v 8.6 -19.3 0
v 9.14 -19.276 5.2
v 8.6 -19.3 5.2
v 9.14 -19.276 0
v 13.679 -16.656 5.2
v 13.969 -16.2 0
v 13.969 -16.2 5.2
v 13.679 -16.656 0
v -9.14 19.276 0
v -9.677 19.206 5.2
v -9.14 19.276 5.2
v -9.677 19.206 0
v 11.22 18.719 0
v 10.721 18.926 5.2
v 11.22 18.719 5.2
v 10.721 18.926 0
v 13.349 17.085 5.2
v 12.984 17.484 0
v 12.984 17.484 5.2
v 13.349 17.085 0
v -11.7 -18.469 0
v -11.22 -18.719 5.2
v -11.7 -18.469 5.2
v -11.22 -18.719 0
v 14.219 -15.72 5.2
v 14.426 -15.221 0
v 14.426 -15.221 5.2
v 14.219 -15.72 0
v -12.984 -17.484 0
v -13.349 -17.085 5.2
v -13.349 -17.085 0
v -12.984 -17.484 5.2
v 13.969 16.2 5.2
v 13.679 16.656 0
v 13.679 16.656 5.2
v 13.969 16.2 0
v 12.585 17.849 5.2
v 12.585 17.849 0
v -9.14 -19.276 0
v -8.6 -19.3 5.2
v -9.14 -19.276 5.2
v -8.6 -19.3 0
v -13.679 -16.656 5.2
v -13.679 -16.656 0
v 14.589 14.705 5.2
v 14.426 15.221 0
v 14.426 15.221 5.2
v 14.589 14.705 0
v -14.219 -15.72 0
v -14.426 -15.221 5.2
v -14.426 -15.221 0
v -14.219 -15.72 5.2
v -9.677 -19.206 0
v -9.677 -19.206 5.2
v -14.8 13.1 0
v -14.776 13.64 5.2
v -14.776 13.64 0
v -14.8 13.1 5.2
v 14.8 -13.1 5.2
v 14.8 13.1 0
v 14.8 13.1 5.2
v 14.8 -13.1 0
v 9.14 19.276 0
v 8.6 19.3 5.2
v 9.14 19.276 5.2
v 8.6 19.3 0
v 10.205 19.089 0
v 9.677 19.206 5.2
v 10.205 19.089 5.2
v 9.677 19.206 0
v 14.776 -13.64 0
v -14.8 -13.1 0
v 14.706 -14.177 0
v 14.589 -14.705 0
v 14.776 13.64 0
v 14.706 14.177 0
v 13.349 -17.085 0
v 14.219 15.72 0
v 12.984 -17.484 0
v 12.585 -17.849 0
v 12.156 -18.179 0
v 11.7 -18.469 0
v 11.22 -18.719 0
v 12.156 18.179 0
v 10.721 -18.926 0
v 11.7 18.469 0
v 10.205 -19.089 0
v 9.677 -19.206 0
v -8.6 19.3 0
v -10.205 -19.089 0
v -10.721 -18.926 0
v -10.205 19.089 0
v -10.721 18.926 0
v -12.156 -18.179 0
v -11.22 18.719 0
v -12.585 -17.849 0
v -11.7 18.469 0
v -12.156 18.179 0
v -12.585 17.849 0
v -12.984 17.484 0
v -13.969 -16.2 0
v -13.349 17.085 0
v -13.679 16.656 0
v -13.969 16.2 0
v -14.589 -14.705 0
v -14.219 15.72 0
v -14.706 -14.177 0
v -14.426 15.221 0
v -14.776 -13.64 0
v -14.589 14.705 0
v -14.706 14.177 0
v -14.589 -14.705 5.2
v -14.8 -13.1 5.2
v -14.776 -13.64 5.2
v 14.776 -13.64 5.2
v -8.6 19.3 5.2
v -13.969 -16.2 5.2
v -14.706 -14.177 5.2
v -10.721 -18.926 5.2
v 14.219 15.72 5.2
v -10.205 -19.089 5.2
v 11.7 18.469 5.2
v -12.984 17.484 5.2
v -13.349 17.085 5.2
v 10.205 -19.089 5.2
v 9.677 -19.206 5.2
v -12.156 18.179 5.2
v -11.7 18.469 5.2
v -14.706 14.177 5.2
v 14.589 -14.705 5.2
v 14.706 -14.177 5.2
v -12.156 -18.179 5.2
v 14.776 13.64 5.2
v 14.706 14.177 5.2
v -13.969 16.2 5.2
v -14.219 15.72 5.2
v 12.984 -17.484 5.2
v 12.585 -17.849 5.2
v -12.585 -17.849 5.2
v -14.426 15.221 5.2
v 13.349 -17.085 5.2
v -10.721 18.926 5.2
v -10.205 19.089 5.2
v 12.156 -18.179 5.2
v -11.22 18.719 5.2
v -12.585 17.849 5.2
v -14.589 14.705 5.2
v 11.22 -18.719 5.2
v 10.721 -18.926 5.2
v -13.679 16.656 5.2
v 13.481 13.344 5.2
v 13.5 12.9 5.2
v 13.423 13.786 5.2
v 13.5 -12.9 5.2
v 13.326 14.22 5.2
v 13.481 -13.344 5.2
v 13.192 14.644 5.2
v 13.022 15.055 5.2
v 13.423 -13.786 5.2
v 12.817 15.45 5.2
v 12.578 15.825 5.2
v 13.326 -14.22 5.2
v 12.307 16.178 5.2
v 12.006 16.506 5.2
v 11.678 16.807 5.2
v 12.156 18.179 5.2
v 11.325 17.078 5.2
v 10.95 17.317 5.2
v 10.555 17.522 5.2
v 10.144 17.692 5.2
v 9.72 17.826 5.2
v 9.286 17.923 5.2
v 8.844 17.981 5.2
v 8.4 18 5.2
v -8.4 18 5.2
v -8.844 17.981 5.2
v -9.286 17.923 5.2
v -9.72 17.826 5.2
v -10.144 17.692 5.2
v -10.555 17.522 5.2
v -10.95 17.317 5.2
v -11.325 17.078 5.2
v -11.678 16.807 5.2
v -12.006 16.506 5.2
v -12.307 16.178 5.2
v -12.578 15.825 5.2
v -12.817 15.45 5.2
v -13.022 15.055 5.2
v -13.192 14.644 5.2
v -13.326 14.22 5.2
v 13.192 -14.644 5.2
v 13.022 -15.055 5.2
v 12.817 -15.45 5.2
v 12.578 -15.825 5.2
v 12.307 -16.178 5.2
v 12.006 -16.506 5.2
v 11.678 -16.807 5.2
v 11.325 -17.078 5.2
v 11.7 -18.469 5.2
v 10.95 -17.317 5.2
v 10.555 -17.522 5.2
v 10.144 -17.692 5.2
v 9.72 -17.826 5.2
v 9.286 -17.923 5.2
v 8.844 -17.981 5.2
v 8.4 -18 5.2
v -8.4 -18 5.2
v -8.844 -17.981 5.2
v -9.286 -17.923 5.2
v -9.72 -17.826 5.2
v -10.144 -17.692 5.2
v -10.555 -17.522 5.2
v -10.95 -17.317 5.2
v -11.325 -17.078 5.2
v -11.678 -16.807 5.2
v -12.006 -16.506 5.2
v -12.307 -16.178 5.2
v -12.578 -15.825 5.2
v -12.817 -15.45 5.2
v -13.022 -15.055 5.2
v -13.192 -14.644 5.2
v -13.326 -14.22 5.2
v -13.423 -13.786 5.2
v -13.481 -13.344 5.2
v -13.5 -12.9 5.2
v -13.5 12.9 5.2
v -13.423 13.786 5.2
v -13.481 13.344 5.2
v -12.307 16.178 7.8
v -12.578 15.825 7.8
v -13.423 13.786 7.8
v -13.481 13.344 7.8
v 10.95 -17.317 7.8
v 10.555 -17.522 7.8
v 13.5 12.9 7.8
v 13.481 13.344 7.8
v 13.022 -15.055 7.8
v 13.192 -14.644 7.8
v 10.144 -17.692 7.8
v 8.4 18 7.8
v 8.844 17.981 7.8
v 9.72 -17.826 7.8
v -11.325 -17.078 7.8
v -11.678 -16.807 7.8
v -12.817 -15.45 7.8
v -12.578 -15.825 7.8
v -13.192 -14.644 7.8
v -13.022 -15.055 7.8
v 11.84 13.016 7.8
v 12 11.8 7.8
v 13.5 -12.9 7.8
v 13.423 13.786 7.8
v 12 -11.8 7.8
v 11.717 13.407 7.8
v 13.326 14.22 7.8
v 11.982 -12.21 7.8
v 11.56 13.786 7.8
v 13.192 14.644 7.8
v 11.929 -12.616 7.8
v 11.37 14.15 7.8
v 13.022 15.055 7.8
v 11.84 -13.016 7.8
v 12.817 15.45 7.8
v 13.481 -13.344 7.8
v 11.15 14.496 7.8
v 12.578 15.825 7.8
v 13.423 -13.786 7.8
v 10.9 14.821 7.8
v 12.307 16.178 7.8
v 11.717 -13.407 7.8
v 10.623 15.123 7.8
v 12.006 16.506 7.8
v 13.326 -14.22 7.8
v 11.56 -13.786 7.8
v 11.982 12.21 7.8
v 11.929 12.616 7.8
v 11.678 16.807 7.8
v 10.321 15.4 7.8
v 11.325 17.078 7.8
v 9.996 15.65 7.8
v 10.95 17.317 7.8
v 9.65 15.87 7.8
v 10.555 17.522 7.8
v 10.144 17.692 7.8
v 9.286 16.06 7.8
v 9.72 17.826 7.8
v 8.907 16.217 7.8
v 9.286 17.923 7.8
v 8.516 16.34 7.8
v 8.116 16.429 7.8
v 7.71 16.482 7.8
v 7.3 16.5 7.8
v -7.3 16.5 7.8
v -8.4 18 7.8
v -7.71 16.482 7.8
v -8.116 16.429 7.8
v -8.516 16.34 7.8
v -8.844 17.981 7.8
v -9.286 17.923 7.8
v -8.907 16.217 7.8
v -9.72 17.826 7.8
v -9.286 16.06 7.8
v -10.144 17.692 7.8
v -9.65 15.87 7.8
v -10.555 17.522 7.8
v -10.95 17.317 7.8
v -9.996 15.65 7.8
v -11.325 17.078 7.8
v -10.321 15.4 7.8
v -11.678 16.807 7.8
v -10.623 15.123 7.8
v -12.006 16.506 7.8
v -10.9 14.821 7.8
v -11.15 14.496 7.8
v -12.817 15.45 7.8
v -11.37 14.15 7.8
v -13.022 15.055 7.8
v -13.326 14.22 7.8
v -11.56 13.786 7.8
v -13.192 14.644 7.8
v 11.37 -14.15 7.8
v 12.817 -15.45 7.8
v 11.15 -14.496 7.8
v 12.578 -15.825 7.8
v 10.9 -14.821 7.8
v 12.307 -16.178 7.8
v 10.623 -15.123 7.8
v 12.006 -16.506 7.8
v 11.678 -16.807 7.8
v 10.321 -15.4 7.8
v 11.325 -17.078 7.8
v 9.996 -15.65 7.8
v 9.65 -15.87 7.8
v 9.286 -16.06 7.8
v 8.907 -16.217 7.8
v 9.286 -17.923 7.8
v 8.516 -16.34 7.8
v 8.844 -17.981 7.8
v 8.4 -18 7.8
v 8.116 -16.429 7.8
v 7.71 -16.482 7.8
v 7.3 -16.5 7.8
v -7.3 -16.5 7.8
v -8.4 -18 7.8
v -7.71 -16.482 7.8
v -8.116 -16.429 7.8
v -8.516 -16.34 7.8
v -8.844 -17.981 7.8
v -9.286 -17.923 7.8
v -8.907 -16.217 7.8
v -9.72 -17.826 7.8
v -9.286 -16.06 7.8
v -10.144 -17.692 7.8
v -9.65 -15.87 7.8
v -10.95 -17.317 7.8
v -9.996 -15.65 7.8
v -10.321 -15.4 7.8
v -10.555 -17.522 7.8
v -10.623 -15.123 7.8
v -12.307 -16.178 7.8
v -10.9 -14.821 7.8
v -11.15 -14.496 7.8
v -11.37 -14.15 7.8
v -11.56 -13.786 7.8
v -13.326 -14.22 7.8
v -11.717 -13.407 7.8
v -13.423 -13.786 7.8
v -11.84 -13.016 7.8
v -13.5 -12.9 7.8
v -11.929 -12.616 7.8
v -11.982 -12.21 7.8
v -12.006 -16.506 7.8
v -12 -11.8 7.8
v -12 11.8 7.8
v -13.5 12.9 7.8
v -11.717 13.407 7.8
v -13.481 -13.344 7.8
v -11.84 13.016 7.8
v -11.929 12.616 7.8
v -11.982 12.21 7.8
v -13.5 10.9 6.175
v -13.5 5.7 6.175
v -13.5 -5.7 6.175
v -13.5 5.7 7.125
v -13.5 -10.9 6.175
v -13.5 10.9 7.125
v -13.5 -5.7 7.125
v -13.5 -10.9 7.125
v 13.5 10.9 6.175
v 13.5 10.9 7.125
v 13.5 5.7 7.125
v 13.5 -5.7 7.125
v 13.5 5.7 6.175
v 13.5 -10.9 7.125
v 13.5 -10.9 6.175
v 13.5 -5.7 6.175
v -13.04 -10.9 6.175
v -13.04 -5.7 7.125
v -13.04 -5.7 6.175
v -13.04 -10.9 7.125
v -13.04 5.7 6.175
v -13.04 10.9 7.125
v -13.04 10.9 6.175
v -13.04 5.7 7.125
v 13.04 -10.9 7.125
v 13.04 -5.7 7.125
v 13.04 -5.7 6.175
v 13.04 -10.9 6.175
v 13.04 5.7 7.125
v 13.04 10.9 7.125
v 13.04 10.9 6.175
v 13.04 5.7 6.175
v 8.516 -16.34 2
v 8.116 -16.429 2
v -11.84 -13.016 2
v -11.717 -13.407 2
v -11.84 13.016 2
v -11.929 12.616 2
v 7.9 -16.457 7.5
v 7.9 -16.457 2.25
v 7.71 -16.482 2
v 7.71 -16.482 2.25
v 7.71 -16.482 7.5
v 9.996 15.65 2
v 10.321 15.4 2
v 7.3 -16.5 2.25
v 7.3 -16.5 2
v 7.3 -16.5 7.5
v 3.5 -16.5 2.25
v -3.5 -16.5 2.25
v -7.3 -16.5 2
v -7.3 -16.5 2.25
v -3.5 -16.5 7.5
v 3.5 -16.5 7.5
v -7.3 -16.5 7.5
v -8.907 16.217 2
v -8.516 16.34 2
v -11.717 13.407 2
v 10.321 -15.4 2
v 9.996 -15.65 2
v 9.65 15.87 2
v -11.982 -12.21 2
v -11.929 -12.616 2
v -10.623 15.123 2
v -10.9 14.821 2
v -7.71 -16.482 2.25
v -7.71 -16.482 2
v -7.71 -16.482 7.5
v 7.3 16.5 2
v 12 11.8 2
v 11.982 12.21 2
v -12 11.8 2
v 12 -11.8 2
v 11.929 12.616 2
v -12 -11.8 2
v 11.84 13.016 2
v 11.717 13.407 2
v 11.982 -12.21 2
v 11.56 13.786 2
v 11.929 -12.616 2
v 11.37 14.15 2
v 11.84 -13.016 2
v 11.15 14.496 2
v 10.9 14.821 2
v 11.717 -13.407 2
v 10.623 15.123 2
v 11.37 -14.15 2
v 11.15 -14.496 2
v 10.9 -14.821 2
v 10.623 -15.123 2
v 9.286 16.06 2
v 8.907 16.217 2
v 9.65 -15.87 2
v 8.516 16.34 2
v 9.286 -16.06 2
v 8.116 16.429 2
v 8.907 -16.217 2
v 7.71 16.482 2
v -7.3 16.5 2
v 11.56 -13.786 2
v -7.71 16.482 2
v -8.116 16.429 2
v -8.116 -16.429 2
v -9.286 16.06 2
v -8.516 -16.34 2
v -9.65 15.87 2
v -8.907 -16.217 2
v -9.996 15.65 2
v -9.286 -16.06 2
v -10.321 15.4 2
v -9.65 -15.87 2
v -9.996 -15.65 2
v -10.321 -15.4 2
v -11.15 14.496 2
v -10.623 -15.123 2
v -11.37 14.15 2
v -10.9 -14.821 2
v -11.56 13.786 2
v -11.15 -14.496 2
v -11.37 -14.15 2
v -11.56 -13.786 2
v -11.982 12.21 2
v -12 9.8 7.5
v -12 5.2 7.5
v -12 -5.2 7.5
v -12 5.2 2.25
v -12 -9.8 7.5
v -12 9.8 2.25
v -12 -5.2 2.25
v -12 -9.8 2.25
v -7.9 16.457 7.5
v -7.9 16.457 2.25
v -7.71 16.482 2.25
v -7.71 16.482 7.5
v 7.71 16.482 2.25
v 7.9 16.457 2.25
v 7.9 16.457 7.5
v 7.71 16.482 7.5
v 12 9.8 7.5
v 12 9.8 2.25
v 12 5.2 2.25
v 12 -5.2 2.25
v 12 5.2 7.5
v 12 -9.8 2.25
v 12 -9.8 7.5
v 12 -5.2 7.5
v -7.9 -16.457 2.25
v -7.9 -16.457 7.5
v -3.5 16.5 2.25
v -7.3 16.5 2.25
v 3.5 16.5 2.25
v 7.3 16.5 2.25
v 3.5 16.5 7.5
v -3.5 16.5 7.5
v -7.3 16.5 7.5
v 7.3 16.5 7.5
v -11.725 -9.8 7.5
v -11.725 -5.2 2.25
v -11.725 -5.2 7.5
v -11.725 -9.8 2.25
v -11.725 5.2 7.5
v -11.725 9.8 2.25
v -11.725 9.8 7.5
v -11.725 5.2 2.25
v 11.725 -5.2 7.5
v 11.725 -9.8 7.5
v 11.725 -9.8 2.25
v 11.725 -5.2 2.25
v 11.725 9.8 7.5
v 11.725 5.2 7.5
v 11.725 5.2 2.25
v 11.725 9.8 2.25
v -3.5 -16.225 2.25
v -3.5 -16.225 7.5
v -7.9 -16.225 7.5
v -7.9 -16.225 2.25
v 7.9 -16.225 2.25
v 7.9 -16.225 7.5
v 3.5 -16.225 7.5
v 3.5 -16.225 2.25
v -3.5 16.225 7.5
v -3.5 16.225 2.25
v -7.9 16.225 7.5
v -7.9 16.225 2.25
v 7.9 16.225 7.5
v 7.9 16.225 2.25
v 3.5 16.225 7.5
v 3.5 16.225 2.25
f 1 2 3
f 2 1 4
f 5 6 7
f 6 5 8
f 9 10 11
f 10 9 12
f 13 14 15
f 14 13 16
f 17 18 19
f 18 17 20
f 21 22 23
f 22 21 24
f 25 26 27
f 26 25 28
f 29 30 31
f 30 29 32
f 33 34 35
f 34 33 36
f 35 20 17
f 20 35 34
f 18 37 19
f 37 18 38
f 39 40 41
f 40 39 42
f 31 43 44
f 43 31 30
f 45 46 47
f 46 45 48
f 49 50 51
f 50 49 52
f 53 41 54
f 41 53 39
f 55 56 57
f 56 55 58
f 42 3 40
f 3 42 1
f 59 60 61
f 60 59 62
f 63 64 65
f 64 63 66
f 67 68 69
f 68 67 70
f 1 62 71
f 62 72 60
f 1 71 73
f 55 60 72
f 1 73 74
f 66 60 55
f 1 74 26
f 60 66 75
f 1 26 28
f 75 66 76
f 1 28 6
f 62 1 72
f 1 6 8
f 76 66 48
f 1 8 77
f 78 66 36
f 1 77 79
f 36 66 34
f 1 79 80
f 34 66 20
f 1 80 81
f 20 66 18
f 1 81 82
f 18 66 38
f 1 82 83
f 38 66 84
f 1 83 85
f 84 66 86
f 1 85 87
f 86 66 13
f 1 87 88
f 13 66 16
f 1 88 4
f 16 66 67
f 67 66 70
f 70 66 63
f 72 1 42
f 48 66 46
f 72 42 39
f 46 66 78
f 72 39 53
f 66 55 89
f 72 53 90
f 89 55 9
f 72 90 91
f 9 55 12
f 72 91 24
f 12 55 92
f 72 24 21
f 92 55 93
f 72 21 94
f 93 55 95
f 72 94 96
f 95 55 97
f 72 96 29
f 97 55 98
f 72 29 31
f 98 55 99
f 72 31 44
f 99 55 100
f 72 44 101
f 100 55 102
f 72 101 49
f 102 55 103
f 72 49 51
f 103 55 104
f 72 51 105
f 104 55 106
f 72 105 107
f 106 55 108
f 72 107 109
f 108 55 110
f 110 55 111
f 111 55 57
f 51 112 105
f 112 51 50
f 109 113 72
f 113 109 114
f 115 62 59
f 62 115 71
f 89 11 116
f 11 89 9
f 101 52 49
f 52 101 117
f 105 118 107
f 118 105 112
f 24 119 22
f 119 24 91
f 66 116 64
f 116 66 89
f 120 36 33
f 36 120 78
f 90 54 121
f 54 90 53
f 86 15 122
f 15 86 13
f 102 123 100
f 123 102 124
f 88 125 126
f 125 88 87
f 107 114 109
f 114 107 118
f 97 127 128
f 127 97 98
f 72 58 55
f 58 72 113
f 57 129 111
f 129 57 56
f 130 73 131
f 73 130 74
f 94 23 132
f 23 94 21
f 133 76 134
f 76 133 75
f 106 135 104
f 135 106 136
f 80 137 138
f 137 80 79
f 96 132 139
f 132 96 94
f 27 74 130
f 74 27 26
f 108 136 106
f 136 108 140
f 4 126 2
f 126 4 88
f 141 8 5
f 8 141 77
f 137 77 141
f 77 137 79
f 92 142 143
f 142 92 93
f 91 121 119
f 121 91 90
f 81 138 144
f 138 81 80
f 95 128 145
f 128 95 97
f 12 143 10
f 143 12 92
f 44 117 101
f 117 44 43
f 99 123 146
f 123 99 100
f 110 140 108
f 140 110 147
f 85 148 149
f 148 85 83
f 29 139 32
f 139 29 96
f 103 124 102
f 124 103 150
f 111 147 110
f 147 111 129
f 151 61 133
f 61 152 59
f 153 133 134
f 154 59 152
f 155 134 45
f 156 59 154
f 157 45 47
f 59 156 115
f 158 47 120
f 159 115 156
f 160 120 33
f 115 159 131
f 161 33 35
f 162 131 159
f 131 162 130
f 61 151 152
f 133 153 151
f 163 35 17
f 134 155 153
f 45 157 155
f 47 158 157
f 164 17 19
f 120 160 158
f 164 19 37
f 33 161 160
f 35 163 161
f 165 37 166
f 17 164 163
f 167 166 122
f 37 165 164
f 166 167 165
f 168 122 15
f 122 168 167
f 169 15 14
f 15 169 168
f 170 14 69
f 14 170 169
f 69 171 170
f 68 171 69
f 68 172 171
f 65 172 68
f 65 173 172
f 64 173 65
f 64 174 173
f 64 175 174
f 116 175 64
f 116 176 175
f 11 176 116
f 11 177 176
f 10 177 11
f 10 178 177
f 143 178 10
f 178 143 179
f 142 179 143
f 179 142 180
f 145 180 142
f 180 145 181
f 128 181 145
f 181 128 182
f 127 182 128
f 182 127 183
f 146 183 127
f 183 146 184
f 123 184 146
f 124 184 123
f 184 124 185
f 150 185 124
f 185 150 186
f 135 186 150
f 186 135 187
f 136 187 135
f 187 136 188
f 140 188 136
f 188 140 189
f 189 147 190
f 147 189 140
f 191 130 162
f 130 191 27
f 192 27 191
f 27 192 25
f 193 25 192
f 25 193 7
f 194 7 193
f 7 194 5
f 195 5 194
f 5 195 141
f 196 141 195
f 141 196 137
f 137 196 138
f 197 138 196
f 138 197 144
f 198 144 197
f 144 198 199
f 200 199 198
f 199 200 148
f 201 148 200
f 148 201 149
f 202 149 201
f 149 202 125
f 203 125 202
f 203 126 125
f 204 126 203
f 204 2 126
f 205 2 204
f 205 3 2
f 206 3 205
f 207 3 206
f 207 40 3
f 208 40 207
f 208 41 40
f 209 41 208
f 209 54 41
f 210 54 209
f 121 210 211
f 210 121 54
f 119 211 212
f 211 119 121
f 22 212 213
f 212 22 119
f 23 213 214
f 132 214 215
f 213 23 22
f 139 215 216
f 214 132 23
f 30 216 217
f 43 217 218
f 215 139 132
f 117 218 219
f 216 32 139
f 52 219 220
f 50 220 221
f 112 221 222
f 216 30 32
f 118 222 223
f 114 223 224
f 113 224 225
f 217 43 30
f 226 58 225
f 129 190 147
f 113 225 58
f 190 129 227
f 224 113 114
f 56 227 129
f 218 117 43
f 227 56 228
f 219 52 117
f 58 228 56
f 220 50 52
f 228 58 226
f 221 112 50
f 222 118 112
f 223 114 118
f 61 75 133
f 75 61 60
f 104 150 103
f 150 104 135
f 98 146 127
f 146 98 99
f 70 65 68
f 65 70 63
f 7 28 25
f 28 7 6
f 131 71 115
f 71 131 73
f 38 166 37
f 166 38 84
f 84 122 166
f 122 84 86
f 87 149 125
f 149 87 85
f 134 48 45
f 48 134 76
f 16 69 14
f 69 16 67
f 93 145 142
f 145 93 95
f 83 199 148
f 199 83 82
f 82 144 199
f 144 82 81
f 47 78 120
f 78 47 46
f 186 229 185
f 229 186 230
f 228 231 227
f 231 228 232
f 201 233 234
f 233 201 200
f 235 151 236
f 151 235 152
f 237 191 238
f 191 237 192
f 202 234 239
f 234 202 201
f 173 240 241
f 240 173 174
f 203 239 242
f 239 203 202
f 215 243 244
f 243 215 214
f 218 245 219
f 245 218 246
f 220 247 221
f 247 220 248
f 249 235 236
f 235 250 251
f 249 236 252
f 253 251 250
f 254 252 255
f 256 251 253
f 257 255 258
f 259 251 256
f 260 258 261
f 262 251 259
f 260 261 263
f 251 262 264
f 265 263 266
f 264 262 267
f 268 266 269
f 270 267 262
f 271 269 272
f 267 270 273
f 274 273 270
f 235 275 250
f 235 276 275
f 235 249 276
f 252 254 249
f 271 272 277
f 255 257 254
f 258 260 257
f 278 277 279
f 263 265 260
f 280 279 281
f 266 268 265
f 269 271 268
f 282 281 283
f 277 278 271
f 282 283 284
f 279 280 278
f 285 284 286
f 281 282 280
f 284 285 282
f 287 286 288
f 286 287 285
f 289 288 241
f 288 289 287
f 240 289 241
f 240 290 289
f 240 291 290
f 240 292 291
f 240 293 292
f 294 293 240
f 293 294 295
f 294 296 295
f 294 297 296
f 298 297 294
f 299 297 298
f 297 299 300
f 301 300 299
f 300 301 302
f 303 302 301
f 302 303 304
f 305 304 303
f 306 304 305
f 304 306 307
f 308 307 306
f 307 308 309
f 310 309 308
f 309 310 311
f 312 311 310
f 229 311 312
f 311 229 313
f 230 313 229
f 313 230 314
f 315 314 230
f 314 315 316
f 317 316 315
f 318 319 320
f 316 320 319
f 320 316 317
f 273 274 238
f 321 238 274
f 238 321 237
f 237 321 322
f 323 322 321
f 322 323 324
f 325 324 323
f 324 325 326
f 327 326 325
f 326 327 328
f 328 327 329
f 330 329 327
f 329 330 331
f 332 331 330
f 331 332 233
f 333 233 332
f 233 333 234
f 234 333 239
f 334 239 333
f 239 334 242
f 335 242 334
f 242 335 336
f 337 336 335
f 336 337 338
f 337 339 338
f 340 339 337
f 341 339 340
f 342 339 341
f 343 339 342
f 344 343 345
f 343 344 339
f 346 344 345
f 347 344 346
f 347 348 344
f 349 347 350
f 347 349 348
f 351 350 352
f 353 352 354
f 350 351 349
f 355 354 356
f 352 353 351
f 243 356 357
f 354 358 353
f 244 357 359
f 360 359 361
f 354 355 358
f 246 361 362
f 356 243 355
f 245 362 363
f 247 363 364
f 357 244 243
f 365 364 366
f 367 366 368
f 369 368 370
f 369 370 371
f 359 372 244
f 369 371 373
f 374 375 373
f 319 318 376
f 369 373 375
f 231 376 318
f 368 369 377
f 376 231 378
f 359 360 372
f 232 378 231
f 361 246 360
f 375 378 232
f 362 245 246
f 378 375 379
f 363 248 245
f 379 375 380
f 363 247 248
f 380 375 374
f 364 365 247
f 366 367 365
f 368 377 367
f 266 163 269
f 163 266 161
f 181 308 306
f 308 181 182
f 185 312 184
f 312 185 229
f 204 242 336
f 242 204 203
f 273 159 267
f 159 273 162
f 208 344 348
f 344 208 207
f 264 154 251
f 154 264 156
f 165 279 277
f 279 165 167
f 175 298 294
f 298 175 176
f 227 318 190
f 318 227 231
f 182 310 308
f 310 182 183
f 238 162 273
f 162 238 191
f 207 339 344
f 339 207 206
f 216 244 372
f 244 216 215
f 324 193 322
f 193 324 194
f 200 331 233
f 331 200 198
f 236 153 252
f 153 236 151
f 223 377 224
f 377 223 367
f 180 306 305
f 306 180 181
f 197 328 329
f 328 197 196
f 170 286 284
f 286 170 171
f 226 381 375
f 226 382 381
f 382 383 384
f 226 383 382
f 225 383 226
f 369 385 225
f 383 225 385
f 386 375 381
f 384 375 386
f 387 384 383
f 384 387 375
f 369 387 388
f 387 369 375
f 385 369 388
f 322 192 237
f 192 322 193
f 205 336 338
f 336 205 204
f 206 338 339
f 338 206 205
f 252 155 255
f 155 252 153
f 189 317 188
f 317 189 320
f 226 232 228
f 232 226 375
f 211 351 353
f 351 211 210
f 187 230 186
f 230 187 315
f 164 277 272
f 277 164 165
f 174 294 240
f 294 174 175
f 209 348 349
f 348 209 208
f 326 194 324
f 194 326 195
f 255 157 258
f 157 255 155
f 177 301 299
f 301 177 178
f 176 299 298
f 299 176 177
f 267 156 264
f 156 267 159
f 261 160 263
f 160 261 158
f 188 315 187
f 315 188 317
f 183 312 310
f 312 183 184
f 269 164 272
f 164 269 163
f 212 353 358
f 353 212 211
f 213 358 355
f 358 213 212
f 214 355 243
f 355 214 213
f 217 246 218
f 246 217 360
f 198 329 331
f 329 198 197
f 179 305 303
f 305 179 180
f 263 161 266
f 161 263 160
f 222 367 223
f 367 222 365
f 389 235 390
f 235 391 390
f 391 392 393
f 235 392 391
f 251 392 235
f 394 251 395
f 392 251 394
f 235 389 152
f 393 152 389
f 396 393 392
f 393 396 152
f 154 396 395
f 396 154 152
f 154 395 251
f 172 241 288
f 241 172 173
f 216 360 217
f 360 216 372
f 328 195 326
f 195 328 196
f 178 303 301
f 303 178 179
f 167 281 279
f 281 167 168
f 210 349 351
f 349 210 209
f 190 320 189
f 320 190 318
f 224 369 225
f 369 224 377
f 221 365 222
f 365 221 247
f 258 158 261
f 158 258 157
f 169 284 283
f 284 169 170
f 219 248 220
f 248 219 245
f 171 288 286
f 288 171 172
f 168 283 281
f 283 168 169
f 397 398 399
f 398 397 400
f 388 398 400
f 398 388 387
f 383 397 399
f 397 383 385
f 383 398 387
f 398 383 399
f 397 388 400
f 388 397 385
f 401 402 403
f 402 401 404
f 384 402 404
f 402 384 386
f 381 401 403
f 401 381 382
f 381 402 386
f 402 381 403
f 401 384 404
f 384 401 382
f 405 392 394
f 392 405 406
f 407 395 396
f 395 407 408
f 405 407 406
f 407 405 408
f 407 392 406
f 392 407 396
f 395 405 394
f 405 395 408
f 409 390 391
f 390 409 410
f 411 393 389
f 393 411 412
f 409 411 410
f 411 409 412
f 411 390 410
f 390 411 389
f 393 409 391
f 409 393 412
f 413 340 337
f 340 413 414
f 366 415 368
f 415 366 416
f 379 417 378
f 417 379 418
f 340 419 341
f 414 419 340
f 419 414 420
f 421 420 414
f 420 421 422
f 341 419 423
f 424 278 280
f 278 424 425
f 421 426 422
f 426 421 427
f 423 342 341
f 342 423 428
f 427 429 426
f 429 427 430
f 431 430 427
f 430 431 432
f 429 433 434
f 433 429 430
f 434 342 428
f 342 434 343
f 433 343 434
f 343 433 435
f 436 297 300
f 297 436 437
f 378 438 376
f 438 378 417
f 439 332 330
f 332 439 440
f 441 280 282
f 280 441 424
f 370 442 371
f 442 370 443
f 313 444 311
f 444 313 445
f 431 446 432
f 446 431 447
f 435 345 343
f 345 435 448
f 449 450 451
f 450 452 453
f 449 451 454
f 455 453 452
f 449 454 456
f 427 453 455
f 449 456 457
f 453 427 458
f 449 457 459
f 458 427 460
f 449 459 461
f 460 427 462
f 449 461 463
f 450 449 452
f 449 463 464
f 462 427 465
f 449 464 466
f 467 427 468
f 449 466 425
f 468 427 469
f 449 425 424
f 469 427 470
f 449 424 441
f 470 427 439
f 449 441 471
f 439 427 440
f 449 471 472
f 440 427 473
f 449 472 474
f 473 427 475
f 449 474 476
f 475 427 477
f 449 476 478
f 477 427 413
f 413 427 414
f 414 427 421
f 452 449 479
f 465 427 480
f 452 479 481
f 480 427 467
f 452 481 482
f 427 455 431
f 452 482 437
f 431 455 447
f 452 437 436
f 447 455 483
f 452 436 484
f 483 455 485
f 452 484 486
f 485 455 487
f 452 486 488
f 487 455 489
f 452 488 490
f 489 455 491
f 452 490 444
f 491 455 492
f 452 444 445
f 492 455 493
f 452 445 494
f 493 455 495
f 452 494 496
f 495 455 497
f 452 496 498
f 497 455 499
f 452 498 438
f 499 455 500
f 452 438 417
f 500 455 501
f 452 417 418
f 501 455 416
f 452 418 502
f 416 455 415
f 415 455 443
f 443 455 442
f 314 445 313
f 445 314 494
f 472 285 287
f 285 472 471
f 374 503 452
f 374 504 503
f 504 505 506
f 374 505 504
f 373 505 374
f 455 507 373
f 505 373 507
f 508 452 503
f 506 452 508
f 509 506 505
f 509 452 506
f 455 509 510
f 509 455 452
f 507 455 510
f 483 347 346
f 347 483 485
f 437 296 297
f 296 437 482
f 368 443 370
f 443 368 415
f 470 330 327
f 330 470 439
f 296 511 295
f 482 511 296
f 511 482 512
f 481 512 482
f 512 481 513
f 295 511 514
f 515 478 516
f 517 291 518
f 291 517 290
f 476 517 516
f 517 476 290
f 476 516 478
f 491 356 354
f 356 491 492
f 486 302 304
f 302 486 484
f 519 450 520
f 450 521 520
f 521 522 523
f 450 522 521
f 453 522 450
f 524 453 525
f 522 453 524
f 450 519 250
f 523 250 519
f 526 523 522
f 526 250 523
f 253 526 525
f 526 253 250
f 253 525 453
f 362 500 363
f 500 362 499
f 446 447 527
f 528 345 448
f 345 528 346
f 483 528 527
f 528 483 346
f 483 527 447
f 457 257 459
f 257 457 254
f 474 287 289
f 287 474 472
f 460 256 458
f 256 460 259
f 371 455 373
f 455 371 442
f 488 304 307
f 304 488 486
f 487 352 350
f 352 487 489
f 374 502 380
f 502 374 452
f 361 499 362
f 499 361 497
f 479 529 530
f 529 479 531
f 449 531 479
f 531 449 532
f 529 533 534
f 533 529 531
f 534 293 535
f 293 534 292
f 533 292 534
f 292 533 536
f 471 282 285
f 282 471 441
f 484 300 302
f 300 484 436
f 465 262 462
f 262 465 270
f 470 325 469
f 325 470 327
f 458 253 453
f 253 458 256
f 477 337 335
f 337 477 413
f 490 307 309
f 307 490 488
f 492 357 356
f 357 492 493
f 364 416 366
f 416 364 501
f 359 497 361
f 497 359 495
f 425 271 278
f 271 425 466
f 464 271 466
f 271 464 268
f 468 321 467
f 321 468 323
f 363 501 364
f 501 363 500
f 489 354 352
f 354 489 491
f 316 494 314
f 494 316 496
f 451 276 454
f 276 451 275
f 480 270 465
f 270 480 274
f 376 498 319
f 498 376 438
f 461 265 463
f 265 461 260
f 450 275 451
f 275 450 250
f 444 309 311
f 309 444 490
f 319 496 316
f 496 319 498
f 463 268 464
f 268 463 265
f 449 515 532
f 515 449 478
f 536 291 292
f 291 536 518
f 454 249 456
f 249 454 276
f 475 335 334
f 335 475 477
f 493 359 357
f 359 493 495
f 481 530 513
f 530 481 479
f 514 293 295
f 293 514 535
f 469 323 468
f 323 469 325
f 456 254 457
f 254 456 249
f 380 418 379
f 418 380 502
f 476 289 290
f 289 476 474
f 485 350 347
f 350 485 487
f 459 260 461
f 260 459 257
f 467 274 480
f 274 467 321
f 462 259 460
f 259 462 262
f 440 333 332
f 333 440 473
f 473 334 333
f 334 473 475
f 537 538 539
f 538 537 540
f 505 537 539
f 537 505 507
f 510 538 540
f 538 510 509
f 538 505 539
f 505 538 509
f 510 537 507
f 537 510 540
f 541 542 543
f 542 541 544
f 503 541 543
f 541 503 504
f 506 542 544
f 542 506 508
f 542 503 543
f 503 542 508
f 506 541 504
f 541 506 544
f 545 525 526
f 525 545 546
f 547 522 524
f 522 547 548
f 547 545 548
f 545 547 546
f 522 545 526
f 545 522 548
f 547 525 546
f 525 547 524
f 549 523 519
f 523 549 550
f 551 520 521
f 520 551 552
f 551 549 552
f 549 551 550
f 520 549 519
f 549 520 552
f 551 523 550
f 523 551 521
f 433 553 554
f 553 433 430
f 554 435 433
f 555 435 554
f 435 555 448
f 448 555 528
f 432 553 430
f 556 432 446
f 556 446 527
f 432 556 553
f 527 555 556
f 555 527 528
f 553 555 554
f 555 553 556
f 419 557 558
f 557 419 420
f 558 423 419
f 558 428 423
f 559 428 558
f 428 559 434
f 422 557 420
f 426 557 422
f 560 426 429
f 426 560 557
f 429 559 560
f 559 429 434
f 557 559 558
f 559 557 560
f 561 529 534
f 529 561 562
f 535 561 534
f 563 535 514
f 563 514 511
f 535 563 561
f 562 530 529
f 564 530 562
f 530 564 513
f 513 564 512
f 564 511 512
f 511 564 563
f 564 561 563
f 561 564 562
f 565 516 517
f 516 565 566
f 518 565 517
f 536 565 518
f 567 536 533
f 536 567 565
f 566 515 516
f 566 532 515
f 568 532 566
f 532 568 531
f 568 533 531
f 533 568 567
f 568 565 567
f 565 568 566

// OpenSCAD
// WT9011DCL-BT50 rehabilitation wearable enclosure + strap holder V3
// Revised from physical print feedback (2026-08-20)
// Units: mm. X = short side, Y = long side. Type-C is on -Y face.
$fn = 72;

PART = "bottom"; // bottom | lid | holder | assembly

// ---------------- Sensor ----------------
sensor_x = 23.5;
sensor_y = 32.5;
sensor_z = 11.4;

// ---------------- Enclosure ----------------
case_x = 29.6;
case_y = 38.6;
case_r = 6.2;

// Bottom is kept at the proven outside size, but the upper neck is now
// substantially smaller so the lid can actually sleeve over it.
bottom_h = 7.8;
lower_h = 5.2;
floor_t = 2.0;
neck_x = 27.0;
neck_y = 36.0;
neck_r = 5.1;

cavity_x = 24.0;
cavity_y = 33.0;
cavity_r = 4.7;

// Lid: same finished outline as the lower body, but a 0.95-1.0 mm skirt
// sleeves over the smaller neck with generous FDM clearance.
lid_h = 9.85;
lid_top_t = 1.25;
lid_overlap_depth = 2.75;
lid_overlap_x = 27.7; // 0.35 mm clearance per side vs neck
lid_overlap_y = 36.7;
lid_overlap_r = 5.45;
lid_cavity_x = 25.8;
lid_cavity_y = 34.8;
lid_cavity_r = 5.0;

// Top controls, referenced to sensor center
button_x = 0;
button_y = -3.2;
button_hole_d_inner = 9.4;
button_hole_d_top = 11.2;

// V3: indicator opening shifted +1.2 mm toward the arrow (+Y) and slightly
// enlarged for printing tolerance. Button opening remains unchanged.
led_x = 7.0;
led_y = -6.1;
led_hole_d = 4.2;

// Type-C opening: keep the established centerline, with a little more plug clearance.
port_w = 12.5;
port_h = 6.4;
port_r = 1.6;
port_global_z = 6.35;

// Lid anti-drop snap: four detents in the neck + four integrated wedge bumps in skirt.
snap_y = 8.3;
snap_len = 5.2;
snap_recess_depth = 0.45;
snap_recess_h = 0.95;
snap_global_z = 6.65;
snap_bump_depth = 0.55;

// ---------------- Holder ----------------
// Follows the supplied reference concept: central support plate + left/right
// strap slots + four one-piece claws that rise OUTSIDE the enclosure and hook
// over the enclosure top surface. No enclosure side-groove retention is used.
holder_x = 50.0;
holder_y = 44.0;
holder_r = 6.0;
holder_t = 2.4;
strap_slot_w = 5.0;
strap_slot_len = 25.0;
strap_slot_r = 2.45;
strap_slot_x = 20.4;

holder_clear = 0.35;
arm_x = 10.3;          // keeps the center Type-C region clear
arm_w = 5.6;
arm_t = 2.2;
arm_inner_y = case_y/2 + holder_clear;
arm_outer_y = arm_inner_y + arm_t;
arm_hook_depth = 2.0;
case_assembled_h = lower_h + lid_h; // 15.05 mm from enclosure bottom to lid top
hook_bottom = case_assembled_h - 0.45; // 0.45 mm top overlap for retention
hook_top = case_assembled_h + 0.75;

// ---------------- Helpers ----------------
module rounded_rect_2d(w,h,r) {
    offset(r=r) square([w-2*r,h-2*r],center=true);
}

module rounded_prism(w,h,z,r) {
    linear_extrude(height=z) rounded_rect_2d(w,h,r);
}

module rounded_slot_2d(w,h,r) {
    rounded_rect_2d(w,h,min(r,min(w,h)/2-0.01));
}

// Opening on -Y face. 2D geometry is X-Z, extruded through Y.
module side_rounded_opening(width,height,radius,zc,y_start=-50,depth=100) {
    translate([0,y_start,zc])
        rotate([90,0,0])
            linear_extrude(height=depth)
                rounded_slot_2d(width,height,radius);
}

// Four shallow snap recesses cut into +/-X faces of the upper neck.
module neck_snap_recesses() {
    zc = snap_global_z;
    for (sx=[-1,1], yy=[-snap_y,snap_y]) {
        translate([sx*(neck_x/2 - snap_recess_depth/2 + 0.03), yy, zc])
            cube([snap_recess_depth+0.08, snap_len, snap_recess_h], center=true);
    }
}

module bottom_case() {
    difference() {
        union() {
            rounded_prism(case_x,case_y,lower_h,case_r);
            translate([0,0,lower_h])
                rounded_prism(neck_x,neck_y,bottom_h-lower_h,neck_r);
        }

        // Sensor tray cavity.
        translate([0,0,floor_t])
            rounded_prism(cavity_x,cavity_y,bottom_h-floor_t+0.4,cavity_r);

        // Common Type-C opening referenced to assembled Z.
        side_rounded_opening(port_w,port_h,port_r,port_global_z,-case_y/2-1.0,6.0);

        // New lid retention recesses.
        neck_snap_recesses();
    }

    // Anti-rattle ribs retain the sensor body without allowing angular play.
    rib_in = 0.10;
    rib_t = 0.45;
    rib_z0 = floor_t+0.25;
    rib_h = bottom_h-floor_t-0.55;
    for (sx=[-1,1], yy=[-7.5,7.5])
        translate([sx*(cavity_x/2-rib_in/2),yy,rib_z0+rib_h/2])
            cube([rib_t,4.6,rib_h],center=true);
    for (sy=[-1,1], xx=[-5.7,5.7])
        translate([xx,sy*(cavity_y/2-rib_in/2),rib_z0+rib_h/2])
            cube([4.4,rib_t,rib_h],center=true);
}

// Integrated inward snap bump on an +/-X inner skirt face.
module one_lid_snap_bump(sx=1, yy=0) {
    inner_x = lid_overlap_x/2;
    z0 = snap_global_z - lower_h - snap_recess_h/2;
    // Ramp: thin at the lower insertion edge, full depth at the upper edge.
    // It overlaps the surrounding skirt solid, so it is a single body.
    if (sx > 0) {
        hull() {
            translate([inner_x-0.12, yy-snap_len/2+0.25, z0])
                cube([0.12,snap_len-0.5,0.18]);
            translate([inner_x-snap_bump_depth, yy-snap_len/2+0.25, z0+0.50])
                cube([snap_bump_depth,snap_len-0.5,0.36]);
        }
        // Short upper catch face improves pull-off resistance.
        translate([inner_x-snap_bump_depth,yy-snap_len/2+0.25,z0+0.50])
            cube([snap_bump_depth,snap_len-0.5,0.38]);
    } else {
        hull() {
            translate([-inner_x, yy-snap_len/2+0.25, z0])
                cube([0.12,snap_len-0.5,0.18]);
            translate([-inner_x, yy-snap_len/2+0.25, z0+0.50])
                cube([snap_bump_depth,snap_len-0.5,0.36]);
        }
        translate([-inner_x,yy-snap_len/2+0.25,z0+0.50])
            cube([snap_bump_depth,snap_len-0.5,0.38]);
    }
}

module lid_case() {
    difference() {
        rounded_prism(case_x,case_y,lid_h,case_r);

        // Deep sleeve cavity: wide enough to actually pass over the bottom neck.
        translate([0,0,-0.05])
            rounded_prism(lid_overlap_x,lid_overlap_y,lid_overlap_depth+0.12,lid_overlap_r);

        // Upper cavity over the sensor, leaving only a 1.25 mm top skin.
        translate([0,0,lid_overlap_depth-0.35])
            rounded_prism(lid_cavity_x,lid_cavity_y,
                lid_h-lid_top_t-(lid_overlap_depth-0.35)+0.05,lid_cavity_r);

        // Type-C opening in the lid, using the same assembled Z datum.
        side_rounded_opening(port_w,port_h,port_r,
            port_global_z-lower_h,-case_y/2-1.0,6.0);

        // Main button opening unchanged.
        translate([button_x,button_y,lid_h-lid_top_t-0.05])
            cylinder(h=lid_top_t+0.2,d1=button_hole_d_inner,d2=button_hole_d_top);

        // Indicator opening shifted upward (+Y).
        translate([led_x,led_y,lid_h-lid_top_t-0.05])
            cylinder(h=lid_top_t+0.2,d=led_hole_d);
    }

    // Four integrated snap bumps engage the neck recesses.
    for (sx=[-1,1], yy=[-snap_y,snap_y])
        one_lid_snap_bump(sx,yy);

    // Orientation arrow retained.
    translate([0,10.8,lid_h])
        linear_extrude(height=0.35)
            polygon(points=[[-2.6,-2.2],[2.6,-2.2],[0,2.5]]);
}

// Extrude a Y-Z polygon along X by 'width'.
module yz_prism(profile,width) {
    rotate([0,90,0])
        linear_extrude(height=width,center=true,convexity=10)
            polygon(points=[for(p=profile) [-p[1],p[0]]]);
}

// One positive-Y claw. Negative side is mirrored.
module holder_claw_pos(xpos) {
    // Main spring arm + top hook as a single profile.
    profile = [
        [arm_outer_y,0],
        [arm_inner_y,0],
        [arm_inner_y,hook_bottom],
        [arm_inner_y-arm_hook_depth,hook_bottom],
        [arm_inner_y-arm_hook_depth,hook_bottom+0.55],
        [arm_inner_y,hook_top],
        [arm_outer_y,hook_top]
    ];

    translate([xpos,0,holder_t-0.30])
        yz_prism(profile,arm_w);

    // Wide, overlapping root block: prevents the four claws from behaving like
    // separately printed posts and greatly increases break-off resistance.
    translate([xpos,arm_inner_y+0.45,holder_t+1.25])
        cube([arm_w+2.0,4.1,3.1],center=true);
}

module holder_claw(xpos,sy=1) {
    if (sy > 0) holder_claw_pos(xpos);
    else mirror([0,1,0]) holder_claw_pos(xpos);
}

module strap_holder() {
    difference() {
        rounded_prism(holder_x,holder_y,holder_t,holder_r);

        // Reference-style left/right strap slots, enlarged for the new enclosure.
        for (sx=[-1,1])
            translate([sx*strap_slot_x,0,-0.1])
                linear_extrude(height=holder_t+0.2)
                    rounded_slot_2d(strap_slot_w,strap_slot_len,strap_slot_r);
    }

    // Four ONE-PIECE claws outside the enclosure. They hook over the TOP surface,
    // rather than engaging shallow grooves on the enclosure side.
    for (xx=[-arm_x,arm_x], sy=[-1,1])
        holder_claw(xx,sy);

    // Two short side locating rails prevent left-right motion while leaving the
    // enclosure removable. These are not retention grooves and do not require
    // matching slots in the enclosure.
    guide_h = 1.15;
    guide_t = 1.15;
    guide_len = 18.0;
    for (sx=[-1,1]) {
        gx = sx*(case_x/2 + holder_clear + guide_t/2);
        translate([gx,0,holder_t+guide_h/2-0.15])
            cube([guide_t,guide_len,guide_h+0.3],center=true);
    }
}

module sensor_dummy() {
    color([0.08,0.08,0.08,0.7])
        translate([0,0,floor_t])
            rounded_prism(sensor_x,sensor_y,sensor_z,4.6);
}

module assembly() {
    color([0.72,0.70,0.65]) bottom_case();
    color([0.80,0.78,0.72]) translate([0,0,lower_h]) lid_case();
    sensor_dummy();
    color([0.80,0.78,0.72]) translate([0,0,-holder_t]) strap_holder();
}

if (PART=="bottom") bottom_case();
else if (PART=="lid") lid_case();
else if (PART=="holder") strap_holder();
else if (PART=="assembly") assembly();
